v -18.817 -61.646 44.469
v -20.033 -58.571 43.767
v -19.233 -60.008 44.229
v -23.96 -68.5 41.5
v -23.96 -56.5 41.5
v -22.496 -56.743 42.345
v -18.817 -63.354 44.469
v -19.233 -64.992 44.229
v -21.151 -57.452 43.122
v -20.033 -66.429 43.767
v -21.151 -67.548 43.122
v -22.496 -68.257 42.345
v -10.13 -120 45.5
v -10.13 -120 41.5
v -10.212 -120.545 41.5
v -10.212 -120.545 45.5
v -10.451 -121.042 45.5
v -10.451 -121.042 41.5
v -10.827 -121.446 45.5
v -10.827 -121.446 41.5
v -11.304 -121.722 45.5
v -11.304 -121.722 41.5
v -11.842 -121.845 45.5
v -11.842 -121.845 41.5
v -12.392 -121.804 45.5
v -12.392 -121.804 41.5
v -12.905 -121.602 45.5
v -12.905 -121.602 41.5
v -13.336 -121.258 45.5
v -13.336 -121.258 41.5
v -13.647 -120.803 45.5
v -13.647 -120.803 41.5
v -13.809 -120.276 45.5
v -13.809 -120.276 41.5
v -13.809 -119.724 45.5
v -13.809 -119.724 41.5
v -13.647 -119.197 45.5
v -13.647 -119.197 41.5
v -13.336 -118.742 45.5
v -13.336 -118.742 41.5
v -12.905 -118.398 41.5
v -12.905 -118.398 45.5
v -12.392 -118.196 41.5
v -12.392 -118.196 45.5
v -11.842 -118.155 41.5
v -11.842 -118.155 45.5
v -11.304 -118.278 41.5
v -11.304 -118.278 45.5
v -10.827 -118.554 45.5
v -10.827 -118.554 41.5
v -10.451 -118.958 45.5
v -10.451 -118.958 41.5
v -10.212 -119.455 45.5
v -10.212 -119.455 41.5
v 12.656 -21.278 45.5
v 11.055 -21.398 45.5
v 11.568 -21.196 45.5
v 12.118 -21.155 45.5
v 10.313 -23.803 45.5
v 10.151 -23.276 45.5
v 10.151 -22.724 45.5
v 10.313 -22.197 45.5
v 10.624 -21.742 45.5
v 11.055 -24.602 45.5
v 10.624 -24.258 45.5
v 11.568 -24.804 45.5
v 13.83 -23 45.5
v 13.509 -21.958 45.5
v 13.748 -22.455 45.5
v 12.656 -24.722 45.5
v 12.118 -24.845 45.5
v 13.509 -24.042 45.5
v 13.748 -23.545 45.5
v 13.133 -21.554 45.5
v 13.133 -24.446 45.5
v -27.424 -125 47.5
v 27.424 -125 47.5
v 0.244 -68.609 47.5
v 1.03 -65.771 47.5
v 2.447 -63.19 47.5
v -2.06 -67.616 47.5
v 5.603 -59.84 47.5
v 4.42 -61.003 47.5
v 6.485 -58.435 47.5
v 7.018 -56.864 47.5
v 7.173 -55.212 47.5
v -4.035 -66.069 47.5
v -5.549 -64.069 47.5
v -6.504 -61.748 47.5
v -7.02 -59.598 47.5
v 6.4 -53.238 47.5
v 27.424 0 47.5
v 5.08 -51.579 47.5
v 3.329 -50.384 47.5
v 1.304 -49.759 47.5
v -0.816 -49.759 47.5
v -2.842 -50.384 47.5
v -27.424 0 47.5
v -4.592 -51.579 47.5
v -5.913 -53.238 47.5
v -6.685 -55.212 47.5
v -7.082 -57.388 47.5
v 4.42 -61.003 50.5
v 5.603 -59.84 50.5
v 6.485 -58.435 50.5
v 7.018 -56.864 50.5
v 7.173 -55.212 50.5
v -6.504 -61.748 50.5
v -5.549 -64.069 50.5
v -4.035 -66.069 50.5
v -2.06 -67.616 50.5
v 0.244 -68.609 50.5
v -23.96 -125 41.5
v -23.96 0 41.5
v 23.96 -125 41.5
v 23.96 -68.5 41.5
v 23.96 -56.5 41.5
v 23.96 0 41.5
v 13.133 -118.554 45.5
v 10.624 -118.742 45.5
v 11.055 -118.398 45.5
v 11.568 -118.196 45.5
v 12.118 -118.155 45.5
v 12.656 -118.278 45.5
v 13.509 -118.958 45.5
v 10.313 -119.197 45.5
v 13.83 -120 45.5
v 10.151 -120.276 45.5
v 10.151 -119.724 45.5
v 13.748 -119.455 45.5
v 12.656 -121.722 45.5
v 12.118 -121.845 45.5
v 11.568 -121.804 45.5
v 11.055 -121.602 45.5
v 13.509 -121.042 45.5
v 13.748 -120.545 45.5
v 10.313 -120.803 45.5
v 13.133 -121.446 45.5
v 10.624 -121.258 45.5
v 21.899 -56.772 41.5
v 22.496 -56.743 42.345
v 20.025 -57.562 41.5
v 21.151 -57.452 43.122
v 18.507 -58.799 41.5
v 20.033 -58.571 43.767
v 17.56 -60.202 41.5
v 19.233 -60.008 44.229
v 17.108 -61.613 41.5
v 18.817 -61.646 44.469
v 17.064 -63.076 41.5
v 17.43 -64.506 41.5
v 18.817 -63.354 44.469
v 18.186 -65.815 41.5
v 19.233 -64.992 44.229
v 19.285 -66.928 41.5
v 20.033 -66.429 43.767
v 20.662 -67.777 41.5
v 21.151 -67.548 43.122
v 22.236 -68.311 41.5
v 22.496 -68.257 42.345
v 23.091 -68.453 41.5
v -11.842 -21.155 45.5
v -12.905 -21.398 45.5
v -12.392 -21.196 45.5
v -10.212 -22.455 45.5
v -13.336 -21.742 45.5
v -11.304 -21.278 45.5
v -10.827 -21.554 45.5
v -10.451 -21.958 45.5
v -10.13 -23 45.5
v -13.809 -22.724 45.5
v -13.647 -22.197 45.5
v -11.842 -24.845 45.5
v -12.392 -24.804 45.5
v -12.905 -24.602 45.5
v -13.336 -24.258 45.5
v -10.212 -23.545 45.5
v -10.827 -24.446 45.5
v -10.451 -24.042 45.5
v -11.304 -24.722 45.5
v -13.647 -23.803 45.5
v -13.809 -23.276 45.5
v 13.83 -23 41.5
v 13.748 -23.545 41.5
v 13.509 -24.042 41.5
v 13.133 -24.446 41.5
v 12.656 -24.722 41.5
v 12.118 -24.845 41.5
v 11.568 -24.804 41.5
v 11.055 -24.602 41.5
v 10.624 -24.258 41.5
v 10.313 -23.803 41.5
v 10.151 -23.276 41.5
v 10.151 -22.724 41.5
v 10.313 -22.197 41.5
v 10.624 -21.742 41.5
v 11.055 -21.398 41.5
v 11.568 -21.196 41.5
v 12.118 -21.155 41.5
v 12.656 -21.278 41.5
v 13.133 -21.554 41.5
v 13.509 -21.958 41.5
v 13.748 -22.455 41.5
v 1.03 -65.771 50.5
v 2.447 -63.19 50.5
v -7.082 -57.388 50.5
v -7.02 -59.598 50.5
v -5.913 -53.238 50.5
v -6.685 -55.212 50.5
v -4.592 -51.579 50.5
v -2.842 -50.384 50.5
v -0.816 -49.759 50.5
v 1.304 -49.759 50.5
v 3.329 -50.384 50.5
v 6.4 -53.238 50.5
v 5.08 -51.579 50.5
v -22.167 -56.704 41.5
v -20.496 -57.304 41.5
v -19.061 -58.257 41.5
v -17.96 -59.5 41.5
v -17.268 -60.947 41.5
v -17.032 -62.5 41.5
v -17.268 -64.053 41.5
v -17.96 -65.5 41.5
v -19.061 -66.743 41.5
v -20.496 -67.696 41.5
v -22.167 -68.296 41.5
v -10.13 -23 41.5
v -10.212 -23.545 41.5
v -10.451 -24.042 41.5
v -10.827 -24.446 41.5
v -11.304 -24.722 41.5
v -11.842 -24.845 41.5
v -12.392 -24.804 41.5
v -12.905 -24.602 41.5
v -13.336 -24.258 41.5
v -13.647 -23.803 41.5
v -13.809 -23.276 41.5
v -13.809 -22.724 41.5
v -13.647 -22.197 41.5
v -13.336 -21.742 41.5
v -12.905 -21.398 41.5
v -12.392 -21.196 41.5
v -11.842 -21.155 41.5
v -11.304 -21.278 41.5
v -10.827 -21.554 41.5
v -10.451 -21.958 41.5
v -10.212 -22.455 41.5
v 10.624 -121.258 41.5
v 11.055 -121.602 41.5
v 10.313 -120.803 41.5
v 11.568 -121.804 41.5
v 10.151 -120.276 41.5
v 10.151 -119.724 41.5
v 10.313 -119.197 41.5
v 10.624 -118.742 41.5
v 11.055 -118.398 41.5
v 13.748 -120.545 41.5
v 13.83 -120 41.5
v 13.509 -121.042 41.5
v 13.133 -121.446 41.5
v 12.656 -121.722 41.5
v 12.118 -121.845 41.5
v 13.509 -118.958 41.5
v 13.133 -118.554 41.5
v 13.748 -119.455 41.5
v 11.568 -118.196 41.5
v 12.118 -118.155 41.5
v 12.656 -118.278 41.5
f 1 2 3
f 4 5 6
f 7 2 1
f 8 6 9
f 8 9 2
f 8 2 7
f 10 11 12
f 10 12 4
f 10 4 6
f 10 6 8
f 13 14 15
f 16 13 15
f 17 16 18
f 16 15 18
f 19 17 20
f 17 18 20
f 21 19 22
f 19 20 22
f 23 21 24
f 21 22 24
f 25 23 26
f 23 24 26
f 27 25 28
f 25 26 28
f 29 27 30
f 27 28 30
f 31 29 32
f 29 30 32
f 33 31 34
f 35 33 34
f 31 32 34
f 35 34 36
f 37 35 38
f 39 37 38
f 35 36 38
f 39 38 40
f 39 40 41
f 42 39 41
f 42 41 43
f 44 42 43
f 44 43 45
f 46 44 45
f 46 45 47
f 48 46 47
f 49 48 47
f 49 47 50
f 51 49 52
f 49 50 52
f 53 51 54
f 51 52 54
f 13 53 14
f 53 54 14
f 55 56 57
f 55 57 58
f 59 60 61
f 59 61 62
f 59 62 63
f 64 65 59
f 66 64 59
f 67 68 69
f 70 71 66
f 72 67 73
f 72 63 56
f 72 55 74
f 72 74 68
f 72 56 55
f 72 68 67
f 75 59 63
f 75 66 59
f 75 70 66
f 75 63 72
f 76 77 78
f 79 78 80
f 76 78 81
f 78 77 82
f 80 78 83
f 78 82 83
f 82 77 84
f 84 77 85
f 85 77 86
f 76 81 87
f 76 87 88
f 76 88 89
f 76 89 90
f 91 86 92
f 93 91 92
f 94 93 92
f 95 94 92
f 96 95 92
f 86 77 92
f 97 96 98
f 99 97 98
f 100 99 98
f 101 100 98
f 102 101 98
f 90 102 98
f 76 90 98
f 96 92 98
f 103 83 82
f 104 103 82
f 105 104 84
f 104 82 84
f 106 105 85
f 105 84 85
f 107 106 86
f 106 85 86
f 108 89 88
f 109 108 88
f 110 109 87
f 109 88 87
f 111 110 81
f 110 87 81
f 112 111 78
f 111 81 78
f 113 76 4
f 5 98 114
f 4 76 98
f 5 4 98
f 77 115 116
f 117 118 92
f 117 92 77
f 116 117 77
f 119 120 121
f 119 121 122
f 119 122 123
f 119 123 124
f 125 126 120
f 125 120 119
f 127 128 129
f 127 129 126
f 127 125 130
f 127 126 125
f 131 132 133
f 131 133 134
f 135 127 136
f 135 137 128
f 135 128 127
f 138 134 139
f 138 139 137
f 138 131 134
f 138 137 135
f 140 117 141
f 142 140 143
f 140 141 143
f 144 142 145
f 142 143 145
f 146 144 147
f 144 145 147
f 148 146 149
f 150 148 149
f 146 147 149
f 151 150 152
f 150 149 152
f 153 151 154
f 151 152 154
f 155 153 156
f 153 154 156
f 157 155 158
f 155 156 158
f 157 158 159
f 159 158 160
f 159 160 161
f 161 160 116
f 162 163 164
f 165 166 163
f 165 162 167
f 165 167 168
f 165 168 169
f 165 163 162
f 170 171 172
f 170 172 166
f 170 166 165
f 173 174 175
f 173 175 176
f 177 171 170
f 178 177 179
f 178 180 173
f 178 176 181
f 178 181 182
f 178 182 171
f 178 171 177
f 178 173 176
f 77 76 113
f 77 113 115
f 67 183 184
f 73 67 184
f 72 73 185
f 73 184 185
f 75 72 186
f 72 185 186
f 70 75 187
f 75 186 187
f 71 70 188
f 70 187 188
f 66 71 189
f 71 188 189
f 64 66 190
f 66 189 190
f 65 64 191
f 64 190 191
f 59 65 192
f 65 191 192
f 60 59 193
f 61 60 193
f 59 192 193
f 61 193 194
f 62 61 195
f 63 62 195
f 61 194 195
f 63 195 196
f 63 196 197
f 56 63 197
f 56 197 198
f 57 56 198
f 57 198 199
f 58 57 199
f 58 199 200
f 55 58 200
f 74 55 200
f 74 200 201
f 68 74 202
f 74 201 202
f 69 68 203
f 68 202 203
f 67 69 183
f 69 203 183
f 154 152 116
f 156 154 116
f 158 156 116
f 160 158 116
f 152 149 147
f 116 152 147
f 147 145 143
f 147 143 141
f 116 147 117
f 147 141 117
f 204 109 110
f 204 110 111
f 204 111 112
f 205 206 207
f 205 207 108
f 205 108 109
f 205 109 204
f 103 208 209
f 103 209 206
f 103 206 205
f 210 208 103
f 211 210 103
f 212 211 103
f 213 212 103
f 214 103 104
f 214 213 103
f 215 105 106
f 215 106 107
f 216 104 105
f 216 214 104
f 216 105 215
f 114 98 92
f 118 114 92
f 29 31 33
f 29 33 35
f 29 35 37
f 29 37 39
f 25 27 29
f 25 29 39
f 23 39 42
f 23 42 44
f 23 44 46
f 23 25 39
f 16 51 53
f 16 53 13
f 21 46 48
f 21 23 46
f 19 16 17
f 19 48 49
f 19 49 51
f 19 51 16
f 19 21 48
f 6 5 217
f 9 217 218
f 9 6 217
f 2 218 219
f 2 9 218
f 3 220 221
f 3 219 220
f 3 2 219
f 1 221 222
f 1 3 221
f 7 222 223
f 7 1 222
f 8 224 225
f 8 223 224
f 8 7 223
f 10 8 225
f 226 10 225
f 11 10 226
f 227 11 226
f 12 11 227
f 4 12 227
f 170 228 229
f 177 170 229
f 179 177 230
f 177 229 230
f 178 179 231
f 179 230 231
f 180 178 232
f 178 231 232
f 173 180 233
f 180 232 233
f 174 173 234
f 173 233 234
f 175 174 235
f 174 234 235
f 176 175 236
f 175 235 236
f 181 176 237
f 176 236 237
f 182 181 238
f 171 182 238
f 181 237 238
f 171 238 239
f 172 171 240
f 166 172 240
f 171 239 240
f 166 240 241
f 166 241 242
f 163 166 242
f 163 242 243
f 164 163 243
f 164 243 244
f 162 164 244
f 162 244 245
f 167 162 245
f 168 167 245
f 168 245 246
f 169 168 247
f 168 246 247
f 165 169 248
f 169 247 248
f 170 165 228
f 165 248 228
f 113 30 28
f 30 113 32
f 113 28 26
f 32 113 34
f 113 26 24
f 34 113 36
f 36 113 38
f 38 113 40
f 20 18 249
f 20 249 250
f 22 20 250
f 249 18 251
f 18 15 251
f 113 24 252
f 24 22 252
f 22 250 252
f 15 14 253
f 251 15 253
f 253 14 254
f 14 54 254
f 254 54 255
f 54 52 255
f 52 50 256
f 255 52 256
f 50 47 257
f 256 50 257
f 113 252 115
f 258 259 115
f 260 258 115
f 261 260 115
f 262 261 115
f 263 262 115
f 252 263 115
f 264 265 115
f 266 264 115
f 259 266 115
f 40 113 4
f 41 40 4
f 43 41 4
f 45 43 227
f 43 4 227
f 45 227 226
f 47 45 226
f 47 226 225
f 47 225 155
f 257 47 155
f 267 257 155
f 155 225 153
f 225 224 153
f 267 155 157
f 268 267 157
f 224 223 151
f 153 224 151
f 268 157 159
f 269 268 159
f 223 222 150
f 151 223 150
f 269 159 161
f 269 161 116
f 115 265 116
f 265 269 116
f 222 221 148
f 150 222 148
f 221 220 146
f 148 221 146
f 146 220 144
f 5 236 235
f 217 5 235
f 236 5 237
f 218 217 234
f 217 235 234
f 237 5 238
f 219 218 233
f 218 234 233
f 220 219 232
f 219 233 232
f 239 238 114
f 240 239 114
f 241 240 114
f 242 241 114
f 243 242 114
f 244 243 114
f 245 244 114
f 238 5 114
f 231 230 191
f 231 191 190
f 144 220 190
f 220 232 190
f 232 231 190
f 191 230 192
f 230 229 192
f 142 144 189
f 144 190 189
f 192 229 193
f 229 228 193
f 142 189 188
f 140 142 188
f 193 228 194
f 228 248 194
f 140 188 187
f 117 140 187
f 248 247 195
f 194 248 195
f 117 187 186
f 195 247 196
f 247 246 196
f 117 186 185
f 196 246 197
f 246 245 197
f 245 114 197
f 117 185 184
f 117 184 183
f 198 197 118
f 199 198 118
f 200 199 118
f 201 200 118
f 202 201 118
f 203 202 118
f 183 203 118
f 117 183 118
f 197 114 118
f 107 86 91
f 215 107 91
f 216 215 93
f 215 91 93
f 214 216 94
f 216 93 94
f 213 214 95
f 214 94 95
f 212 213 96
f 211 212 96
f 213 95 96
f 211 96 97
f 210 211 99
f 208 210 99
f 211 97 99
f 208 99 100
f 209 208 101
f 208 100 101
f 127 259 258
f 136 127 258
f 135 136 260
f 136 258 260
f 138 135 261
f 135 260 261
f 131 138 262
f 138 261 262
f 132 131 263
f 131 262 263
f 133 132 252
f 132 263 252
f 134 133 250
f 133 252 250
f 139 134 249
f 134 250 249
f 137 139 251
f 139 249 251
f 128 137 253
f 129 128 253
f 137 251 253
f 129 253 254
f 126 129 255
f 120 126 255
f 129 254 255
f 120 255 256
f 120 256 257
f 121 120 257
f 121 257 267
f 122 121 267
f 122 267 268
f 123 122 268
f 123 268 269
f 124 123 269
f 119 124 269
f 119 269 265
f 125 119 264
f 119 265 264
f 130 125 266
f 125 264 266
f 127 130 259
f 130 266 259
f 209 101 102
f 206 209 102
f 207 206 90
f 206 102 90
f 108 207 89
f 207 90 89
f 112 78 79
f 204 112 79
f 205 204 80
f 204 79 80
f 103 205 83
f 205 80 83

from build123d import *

# Parameters (mm, degrees)
F1_DEPTH  = 125
F2_R      = 1.85
F3_DEPTH  = 4
F5_DEPTH  = 3
F7_R      = 6
F8_DEPTH  = 25
F10_R     = 6
F11_DEPTH = 25


with BuildPart() as f1:
    # F0 (on Front) → F1 (new body)
    with BuildSketch(Plane.XZ):
        Polygon((27.424138, 47.5), (-27.424138, 47.5), (-23.960036, 41.5), (23.960036, 41.5), align=None)
    extrude(amount=F1_DEPTH)

    # F2 (on face) → F3 (cut)
    with BuildSketch(Plane(origin=(0, 0, 41.5), x_dir=(1, 0, 0), z_dir=(0, 0, -1))):
        with BuildLine():
            ThreePointArc((-13.830018, 120), (-11.980018, 118.15), (-10.130018, 120))
            Line((-10.130018, 120), (-13.830018, 120))
        make_face()
        with BuildLine():
            Line((-13.830018, 120), (-10.130018, 120))
            ThreePointArc((-10.130018, 120), (-11.980018, 121.85), (-13.830018, 120))
        make_face()
        with Locations((11.980018, 120)):
            Circle(F2_R)
        with BuildLine():
            ThreePointArc((-13.830018, 23), (-11.980018, 21.15), (-10.130018, 23))
            Line((-10.130018, 23), (-13.830018, 23))
        make_face()
        with BuildLine():
            Line((-13.830018, 23), (-10.130018, 23))
            ThreePointArc((-10.130018, 23), (-11.980018, 24.85), (-13.830018, 23))
        make_face()
        with Locations((11.980018, 23)):
            Circle(F2_R)
    extrude(amount=-F3_DEPTH, mode=Mode.SUBTRACT)

    # F4 (on face) → F5 (join)
    with BuildSketch(Plane.XY.offset(47.5)):
        with BuildLine():
            ThreePointArc((4.419879, -61.002997), (6.484743, -58.434913), (7.172588, -55.212246))
            ThreePointArc((7.172588, -55.212246), (0.243912, -49.679184), (-6.684764, -55.212246))
            ThreePointArc((-6.684764, -55.212246), (-7.10843, -58.494572), (-6.503523, -61.748377))
            ThreePointArc((-6.503523, -61.748377), (-4.034953, -66.068801), (0.243912, -68.608727))
            ThreePointArc((0.243912, -68.608727), (1.663957, -64.439127), (4.419879, -61.002997))
        make_face()
    extrude(amount=F5_DEPTH)

    # F7 (on face) → F8 (cut)
    with BuildSketch(Plane(origin=(-23.960036, 0, 41.5), x_dir=(0.866025, 0, 0.5), z_dir=(0.5, 0, -0.866025))):
        with Locations((0, 62.5)):
            Circle(F7_R)
    extrude(amount=F8_DEPTH, mode=Mode.SUBTRACT)

    # F10 (on face) → F11 (cut)
    with BuildSketch(Plane(origin=(23.960036, 0, 41.5), x_dir=(0.866025, 0, -0.5), z_dir=(0.5, 0, 0.866025))):
        with Locations((0, -62.5)):
            Circle(F10_R)
    extrude(amount=-F11_DEPTH, mode=Mode.SUBTRACT)


solid = f1.part
